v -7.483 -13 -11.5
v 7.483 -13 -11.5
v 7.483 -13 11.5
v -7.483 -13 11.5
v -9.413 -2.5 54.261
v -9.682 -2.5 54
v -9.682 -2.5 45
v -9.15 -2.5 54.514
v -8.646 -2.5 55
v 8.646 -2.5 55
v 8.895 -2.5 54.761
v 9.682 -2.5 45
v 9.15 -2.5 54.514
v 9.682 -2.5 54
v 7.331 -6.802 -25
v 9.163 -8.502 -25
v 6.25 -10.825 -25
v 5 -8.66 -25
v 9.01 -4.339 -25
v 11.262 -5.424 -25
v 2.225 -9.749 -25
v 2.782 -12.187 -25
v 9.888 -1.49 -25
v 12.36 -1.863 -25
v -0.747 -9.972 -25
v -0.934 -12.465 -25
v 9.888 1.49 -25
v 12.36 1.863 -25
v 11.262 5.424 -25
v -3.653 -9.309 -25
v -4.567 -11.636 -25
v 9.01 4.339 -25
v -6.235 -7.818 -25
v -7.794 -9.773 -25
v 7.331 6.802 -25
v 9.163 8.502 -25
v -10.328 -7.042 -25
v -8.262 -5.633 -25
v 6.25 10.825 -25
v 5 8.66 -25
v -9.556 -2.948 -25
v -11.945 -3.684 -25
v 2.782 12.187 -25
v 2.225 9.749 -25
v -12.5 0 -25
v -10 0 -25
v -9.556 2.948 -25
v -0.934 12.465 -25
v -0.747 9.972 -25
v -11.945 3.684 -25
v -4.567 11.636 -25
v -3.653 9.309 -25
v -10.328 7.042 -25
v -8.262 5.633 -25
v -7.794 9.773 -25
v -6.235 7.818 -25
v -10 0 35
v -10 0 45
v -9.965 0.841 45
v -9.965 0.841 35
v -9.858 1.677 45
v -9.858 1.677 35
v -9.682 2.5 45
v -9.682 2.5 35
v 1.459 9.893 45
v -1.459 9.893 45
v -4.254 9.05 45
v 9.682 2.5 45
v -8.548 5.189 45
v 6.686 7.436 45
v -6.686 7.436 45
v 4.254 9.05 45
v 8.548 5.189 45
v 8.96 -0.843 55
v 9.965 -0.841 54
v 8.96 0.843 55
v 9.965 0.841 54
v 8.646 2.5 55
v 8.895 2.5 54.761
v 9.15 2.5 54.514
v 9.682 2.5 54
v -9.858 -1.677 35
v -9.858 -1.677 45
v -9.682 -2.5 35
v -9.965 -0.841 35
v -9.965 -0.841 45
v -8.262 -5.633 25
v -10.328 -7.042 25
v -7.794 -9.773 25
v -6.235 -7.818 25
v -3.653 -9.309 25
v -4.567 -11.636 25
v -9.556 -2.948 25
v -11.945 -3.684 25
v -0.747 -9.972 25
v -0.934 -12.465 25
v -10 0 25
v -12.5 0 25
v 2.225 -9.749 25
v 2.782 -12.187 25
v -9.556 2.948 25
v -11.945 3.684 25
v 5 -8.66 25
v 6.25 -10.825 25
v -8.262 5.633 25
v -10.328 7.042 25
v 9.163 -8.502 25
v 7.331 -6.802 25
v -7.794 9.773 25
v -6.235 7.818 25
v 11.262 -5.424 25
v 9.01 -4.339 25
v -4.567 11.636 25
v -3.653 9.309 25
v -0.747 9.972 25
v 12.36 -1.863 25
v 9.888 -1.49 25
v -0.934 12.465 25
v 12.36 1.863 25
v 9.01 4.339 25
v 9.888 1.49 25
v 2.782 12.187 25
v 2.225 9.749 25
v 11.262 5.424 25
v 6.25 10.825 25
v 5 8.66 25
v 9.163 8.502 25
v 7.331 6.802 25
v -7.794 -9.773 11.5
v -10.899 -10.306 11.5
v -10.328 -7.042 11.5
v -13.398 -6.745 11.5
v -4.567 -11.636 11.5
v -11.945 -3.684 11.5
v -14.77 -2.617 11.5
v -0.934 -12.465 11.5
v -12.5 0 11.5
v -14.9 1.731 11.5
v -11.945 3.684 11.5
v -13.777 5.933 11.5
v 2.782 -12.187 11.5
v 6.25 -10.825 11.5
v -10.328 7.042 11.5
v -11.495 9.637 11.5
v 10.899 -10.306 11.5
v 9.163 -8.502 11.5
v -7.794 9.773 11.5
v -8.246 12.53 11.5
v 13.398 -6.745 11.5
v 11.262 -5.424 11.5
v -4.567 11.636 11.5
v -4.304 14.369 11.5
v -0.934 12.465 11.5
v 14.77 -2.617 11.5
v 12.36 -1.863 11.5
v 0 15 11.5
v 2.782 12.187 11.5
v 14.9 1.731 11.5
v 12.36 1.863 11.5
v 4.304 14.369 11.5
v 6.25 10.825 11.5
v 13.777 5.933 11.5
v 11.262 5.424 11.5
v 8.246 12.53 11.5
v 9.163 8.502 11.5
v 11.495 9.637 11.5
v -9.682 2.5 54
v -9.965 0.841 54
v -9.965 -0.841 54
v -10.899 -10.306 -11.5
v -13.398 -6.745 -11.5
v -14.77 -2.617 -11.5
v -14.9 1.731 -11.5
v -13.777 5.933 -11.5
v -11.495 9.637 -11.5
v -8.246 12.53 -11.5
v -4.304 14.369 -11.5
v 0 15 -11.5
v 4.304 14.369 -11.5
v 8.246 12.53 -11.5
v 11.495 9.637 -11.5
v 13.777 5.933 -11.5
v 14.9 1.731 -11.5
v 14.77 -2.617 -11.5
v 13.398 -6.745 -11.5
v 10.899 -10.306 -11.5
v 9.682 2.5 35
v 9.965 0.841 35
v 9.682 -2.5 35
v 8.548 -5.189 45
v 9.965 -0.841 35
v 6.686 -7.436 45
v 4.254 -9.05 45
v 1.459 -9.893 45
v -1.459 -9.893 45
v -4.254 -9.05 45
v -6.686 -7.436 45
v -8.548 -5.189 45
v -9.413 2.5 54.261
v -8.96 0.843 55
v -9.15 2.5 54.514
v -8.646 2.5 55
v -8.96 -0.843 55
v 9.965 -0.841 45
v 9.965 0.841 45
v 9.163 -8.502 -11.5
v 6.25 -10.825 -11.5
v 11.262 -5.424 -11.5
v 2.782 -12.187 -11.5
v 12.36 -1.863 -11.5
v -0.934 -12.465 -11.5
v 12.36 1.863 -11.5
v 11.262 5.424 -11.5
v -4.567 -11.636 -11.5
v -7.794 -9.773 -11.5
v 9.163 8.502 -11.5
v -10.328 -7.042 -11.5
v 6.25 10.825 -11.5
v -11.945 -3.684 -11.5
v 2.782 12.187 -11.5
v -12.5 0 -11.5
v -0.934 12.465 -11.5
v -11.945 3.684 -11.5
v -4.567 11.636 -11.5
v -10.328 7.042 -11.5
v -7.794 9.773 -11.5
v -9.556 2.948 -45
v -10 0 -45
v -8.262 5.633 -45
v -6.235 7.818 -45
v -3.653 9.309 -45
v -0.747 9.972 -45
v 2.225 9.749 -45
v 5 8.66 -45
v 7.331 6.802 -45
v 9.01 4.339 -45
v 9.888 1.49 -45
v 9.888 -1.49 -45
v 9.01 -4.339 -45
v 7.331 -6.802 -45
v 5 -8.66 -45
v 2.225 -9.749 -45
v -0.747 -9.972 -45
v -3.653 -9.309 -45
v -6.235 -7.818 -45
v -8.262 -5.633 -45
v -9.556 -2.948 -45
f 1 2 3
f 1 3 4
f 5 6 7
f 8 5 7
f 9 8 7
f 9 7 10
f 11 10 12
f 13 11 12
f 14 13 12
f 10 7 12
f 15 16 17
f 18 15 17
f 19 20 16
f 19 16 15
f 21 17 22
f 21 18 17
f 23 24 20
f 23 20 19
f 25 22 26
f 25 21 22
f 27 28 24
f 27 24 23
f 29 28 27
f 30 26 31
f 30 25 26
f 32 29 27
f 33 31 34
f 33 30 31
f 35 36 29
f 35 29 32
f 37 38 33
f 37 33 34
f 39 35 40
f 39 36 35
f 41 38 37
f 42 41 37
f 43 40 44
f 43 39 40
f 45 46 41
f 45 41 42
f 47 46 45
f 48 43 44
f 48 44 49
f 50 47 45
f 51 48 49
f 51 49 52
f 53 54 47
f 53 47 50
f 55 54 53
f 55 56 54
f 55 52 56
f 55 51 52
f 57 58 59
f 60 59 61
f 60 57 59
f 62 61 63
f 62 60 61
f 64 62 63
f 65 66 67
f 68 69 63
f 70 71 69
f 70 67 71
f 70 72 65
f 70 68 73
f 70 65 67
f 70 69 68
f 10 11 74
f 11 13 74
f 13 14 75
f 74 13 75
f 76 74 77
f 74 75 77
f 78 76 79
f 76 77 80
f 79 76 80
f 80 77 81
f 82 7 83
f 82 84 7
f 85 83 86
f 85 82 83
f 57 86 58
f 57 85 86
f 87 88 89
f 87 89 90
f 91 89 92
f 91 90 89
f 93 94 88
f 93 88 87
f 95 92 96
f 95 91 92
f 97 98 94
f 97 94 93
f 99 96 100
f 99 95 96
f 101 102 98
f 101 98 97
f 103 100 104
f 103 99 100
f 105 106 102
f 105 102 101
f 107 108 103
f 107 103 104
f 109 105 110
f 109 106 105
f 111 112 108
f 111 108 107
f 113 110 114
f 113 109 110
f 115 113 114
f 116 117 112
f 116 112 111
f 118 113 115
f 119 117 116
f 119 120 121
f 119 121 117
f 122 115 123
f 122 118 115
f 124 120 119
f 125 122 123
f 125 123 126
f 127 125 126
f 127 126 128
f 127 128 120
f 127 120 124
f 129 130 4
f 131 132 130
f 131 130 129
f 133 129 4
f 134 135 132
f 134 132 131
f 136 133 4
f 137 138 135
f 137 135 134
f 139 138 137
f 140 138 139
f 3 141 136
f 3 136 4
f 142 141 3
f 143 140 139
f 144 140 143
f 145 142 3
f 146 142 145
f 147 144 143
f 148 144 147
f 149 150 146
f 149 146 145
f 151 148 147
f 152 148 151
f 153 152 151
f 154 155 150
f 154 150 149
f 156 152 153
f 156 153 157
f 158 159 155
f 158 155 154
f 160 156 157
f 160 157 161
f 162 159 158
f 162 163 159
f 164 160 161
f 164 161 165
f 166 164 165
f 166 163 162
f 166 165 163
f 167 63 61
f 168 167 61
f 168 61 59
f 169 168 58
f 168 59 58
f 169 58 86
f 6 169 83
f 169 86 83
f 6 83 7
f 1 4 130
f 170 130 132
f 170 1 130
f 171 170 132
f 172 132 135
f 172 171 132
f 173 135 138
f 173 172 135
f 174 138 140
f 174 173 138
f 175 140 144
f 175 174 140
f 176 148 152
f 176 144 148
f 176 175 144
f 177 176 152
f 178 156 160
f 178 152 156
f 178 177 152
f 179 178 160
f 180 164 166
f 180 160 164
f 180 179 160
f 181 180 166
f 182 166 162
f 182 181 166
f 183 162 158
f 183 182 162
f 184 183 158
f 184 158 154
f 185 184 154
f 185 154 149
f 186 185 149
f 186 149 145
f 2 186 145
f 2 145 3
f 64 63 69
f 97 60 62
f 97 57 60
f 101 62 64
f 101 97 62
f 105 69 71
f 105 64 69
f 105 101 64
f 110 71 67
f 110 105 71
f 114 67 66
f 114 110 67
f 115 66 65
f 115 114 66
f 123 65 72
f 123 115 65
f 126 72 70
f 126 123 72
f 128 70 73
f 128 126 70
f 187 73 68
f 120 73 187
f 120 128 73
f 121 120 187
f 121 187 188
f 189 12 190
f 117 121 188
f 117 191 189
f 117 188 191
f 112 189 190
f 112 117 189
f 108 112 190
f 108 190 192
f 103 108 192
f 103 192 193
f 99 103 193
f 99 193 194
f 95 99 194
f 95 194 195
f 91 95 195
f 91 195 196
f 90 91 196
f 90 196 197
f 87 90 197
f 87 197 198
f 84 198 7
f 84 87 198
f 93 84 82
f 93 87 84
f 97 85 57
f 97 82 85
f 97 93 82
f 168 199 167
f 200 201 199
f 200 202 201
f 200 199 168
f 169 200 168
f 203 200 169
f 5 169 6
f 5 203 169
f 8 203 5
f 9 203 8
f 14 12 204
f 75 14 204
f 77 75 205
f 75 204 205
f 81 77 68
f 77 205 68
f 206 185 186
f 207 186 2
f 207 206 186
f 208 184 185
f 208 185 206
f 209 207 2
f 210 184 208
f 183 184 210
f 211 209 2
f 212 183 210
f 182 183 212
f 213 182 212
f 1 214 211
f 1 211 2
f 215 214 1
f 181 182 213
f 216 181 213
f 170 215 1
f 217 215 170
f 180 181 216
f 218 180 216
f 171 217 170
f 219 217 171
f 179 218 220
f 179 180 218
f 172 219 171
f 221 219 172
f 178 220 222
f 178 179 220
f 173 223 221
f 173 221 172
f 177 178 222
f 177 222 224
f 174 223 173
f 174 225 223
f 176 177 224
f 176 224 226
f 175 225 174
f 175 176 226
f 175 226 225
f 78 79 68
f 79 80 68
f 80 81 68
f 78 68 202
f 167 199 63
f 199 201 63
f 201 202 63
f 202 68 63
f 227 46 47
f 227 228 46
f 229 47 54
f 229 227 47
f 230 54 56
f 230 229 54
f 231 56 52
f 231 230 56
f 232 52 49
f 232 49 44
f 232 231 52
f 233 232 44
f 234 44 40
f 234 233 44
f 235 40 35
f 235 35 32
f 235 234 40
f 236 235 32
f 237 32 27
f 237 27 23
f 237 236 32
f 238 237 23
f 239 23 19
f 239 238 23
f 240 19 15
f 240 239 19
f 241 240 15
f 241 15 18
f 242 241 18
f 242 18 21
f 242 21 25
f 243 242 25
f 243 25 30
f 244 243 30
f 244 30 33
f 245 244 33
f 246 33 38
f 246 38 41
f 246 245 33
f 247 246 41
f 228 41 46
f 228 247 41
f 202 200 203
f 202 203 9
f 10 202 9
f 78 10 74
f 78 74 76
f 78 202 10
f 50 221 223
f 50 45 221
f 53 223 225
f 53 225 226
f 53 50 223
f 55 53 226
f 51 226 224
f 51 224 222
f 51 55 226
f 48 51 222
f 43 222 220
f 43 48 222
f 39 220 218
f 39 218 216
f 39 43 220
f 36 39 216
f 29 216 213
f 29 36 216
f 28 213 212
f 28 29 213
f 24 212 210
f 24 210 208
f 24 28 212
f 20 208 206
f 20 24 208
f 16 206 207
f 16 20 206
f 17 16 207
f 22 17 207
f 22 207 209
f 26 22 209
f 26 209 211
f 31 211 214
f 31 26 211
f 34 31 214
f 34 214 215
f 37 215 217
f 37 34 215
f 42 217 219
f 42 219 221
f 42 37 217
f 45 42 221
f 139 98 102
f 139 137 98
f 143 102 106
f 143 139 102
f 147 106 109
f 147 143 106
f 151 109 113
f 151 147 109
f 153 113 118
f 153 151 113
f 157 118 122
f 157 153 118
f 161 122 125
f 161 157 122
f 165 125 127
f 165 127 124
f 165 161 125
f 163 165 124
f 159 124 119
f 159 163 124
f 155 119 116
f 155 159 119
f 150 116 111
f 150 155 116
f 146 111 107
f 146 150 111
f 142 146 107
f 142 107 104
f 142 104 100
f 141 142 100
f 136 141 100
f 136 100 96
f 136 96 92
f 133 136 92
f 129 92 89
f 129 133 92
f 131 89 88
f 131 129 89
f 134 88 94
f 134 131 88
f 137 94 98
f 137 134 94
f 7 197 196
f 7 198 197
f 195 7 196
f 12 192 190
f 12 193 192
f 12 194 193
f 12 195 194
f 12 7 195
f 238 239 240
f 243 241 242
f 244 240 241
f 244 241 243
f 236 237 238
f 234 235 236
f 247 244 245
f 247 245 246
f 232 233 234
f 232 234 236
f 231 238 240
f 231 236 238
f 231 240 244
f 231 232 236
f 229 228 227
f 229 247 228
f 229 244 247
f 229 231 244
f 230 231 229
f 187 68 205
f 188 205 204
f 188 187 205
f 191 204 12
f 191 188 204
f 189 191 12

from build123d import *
from build123d import SkipClean  # not in build123d's __all__

# Parameters (mm, degrees)
F3_DEPTH      = 25
F3_DEPTH_BACK = 25
F6_DEPTH      = 10
F6_DEPTH_BACK = 10
F7_SIZE       = 1


with BuildPart() as f1:
    # F0 (on Front) → F1 (revolve)
    with BuildSketch(Plane.XZ):
        Polygon((-12.5, 11.5), (-15, 11.5), (-15, 0), (-15, -11.5), (-12.5, -11.5), (-12.5, -25), (-10, -25), (-10, -45), (0, -45), (0, 0), (0, 45), (-10, 45), (-10, 25), (-12.5, 25), align=None)
    revolve(axis=Axis((0, 0, 22.5), (0, 0, -1)))

    # F2 (on Top) → F3 (cut, two sides)
    with BuildSketch(Plane.XY) as f3_sk:
        Polygon((0, -13), (-15, -13), (-15, -17), (0, -17), (15, -17), (15, -13), align=None)
    extrude(amount=F3_DEPTH, mode=Mode.SUBTRACT)
    extrude(f3_sk.sketch, amount=-F3_DEPTH_BACK, mode=Mode.SUBTRACT)

    # F5 (on offset) → F6 (join, two sides)
    with BuildSketch(Plane.XY.offset(45)) as f6_sk:
        with BuildLine():
            Line((9.6824583655, 2.5), (-9.6824583655, 2.5))
            ThreePointArc((-9.6824583655, 2.5), (-10, 0), (-9.6824583655, -2.5))
            Line((-9.6824583655, -2.5), (9.6824583655, -2.5))
            ThreePointArc((9.6824583655, -2.5), (10, 0), (9.6824583655, 2.5))
        make_face()
    with SkipClean():  # cleaning this boolean's faces spoils the solid; the shape is the same uncleaned
        extrude(amount=F6_DEPTH)
        extrude(f6_sk.sketch, amount=-F6_DEPTH_BACK)

    # F7
    f7_edges = [f1.edges().sort_by_distance(p)[0] for p in [
        (10, 0, 55),
        (-10, 0, 55),
    ]]
    chamfer(f7_edges, length=F7_SIZE)


solid = f1.part
